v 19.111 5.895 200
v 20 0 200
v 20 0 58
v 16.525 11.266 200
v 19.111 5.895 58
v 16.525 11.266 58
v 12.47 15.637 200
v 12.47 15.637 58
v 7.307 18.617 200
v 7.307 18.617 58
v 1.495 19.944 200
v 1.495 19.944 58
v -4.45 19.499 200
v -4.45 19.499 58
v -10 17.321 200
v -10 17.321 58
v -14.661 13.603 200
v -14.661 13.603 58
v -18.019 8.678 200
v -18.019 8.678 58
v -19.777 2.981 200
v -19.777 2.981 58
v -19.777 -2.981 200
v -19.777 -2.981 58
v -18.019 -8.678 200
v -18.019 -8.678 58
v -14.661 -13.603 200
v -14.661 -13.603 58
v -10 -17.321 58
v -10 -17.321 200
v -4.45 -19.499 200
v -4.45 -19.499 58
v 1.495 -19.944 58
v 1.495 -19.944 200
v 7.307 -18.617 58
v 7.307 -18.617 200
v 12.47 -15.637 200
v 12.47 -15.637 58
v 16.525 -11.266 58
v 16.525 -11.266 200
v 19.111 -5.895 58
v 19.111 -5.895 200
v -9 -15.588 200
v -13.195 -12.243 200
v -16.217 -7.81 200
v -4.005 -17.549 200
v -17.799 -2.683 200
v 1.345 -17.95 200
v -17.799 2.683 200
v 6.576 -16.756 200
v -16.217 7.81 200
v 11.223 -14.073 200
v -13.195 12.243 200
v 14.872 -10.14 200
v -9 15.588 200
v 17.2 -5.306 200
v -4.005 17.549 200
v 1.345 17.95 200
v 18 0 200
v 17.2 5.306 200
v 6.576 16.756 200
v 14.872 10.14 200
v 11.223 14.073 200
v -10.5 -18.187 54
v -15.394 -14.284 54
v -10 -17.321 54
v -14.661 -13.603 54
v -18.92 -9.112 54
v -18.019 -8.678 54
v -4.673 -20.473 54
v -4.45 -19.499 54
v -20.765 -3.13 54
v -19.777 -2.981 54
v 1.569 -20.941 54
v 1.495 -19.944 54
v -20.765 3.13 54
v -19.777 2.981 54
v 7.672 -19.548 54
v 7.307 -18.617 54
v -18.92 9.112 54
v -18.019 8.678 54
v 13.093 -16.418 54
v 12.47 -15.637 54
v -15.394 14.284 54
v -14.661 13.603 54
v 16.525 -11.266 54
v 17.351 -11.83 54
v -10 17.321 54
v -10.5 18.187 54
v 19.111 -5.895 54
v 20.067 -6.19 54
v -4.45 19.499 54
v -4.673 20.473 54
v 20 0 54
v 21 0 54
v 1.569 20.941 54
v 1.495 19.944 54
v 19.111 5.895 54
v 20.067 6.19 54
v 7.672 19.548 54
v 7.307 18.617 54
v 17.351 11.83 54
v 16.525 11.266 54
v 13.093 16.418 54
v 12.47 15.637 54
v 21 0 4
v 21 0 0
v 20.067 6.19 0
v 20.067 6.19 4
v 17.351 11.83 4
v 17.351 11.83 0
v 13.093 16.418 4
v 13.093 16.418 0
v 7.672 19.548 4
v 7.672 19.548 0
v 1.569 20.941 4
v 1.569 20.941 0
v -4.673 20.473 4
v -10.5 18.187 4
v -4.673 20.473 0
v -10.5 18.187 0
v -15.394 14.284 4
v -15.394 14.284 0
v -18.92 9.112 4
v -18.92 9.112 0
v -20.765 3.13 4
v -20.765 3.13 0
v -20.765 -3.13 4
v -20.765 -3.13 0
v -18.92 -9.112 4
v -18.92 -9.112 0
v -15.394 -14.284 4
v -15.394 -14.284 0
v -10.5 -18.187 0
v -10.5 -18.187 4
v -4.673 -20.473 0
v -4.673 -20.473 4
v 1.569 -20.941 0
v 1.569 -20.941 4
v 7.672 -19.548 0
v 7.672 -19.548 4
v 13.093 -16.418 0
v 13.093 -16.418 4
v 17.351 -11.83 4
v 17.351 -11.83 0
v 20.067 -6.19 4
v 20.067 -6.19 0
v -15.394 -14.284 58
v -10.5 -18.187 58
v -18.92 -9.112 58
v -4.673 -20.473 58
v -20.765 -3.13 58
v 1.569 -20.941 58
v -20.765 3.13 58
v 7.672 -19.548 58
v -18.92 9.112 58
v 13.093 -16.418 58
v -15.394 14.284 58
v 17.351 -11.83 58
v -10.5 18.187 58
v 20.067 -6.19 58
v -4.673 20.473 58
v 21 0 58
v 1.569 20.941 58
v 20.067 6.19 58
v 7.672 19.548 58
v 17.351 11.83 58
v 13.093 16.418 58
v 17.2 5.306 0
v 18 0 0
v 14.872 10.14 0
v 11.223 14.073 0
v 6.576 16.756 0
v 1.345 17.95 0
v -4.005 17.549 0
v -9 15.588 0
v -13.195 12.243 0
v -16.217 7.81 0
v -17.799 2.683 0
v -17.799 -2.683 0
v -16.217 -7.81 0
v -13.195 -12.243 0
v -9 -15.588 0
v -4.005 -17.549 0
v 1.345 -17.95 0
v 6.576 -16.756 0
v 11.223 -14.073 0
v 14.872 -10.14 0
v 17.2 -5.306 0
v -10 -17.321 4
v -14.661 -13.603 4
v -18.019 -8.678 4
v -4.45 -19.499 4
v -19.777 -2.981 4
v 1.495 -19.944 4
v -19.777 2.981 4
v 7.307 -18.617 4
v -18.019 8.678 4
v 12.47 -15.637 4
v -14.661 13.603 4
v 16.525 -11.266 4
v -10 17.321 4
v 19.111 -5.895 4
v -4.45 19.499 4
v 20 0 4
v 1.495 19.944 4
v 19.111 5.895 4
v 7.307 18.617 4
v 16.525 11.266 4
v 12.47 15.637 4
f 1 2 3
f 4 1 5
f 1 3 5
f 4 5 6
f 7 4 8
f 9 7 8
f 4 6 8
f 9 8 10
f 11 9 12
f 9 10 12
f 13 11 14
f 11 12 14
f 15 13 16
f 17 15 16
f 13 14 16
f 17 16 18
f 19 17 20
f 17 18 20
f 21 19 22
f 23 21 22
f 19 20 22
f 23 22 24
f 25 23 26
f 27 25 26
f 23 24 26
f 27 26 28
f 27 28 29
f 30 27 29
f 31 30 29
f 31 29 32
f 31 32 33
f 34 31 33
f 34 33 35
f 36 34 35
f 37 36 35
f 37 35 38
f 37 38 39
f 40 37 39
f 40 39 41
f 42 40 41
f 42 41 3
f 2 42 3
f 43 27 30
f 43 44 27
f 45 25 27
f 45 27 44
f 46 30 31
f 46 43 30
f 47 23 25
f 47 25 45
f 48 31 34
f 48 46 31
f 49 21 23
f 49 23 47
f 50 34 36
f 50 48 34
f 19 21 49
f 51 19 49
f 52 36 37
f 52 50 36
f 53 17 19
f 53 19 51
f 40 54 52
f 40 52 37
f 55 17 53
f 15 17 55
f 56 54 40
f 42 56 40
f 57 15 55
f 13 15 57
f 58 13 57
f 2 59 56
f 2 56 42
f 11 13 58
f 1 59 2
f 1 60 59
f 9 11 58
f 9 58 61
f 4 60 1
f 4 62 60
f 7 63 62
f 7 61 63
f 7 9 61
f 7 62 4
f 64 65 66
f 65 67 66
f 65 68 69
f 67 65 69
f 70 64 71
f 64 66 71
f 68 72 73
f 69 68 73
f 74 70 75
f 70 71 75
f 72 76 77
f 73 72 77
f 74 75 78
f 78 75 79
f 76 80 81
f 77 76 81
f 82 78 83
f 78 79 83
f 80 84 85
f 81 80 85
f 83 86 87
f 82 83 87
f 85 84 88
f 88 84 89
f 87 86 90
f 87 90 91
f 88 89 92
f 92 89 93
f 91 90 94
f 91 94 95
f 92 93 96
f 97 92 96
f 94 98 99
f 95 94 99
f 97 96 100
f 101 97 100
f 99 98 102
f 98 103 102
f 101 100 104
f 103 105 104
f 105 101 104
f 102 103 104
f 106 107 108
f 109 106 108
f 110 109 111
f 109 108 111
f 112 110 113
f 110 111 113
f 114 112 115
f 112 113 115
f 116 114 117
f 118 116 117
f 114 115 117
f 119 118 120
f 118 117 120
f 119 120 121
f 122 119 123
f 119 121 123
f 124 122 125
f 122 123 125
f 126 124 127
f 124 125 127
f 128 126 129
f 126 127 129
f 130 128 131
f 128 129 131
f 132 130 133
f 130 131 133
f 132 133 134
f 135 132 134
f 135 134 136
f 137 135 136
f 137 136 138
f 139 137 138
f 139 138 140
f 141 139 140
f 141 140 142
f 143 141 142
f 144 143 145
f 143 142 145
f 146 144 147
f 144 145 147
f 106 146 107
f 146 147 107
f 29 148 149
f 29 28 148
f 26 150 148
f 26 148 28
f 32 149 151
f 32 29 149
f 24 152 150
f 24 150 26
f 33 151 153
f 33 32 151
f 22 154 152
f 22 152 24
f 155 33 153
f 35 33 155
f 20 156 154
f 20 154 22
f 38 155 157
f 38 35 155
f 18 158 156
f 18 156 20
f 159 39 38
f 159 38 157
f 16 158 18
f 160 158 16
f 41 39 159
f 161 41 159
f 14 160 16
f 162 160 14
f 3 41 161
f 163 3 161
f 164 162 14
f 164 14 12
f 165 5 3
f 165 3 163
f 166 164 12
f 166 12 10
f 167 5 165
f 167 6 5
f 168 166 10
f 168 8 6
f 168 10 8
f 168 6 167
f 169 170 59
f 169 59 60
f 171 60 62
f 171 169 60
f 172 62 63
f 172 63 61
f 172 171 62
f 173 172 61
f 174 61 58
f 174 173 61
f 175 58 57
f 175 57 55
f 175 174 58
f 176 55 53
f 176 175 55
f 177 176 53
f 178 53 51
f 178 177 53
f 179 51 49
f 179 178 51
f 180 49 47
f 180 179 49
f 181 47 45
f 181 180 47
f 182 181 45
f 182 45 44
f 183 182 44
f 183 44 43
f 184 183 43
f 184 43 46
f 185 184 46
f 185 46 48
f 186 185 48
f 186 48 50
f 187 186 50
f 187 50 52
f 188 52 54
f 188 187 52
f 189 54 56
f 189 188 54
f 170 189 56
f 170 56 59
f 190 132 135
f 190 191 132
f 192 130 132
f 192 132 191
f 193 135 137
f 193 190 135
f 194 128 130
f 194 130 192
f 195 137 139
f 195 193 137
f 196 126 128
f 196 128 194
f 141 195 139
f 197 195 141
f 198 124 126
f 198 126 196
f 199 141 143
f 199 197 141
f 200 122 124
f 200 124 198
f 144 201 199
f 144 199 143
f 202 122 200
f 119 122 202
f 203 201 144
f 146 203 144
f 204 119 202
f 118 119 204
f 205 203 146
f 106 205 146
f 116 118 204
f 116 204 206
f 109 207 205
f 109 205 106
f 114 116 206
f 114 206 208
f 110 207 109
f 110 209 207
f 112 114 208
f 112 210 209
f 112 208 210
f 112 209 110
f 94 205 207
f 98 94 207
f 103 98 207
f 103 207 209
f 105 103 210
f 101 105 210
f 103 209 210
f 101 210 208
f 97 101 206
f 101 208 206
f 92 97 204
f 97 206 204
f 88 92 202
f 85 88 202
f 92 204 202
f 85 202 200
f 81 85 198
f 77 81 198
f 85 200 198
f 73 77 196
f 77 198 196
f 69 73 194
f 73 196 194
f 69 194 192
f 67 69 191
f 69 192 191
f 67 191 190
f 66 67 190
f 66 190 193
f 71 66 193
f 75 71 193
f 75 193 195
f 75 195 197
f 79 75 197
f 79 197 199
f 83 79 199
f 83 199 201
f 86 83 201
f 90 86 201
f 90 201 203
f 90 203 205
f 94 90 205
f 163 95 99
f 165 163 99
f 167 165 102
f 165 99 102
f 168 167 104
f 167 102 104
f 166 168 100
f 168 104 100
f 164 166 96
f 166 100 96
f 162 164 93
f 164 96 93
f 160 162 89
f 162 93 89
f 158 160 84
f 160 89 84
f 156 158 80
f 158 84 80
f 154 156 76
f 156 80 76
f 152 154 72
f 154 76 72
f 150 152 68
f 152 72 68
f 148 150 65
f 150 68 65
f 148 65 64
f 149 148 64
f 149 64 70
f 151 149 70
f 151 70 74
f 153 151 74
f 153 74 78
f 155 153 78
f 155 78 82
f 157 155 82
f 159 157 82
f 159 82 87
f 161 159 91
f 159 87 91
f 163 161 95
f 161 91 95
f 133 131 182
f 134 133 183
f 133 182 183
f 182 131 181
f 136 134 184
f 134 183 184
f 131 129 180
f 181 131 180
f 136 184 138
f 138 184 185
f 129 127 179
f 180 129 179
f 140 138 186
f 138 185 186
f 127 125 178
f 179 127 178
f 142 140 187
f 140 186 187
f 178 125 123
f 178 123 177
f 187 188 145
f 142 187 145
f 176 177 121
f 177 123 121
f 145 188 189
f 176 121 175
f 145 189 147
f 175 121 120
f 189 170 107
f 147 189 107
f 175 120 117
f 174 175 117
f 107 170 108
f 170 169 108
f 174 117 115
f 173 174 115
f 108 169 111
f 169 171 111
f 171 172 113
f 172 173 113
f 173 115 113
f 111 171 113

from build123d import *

# Parameters (mm, degrees)
SKETCH2_R           = 20
SKETCH2_R_2         = 18
BOSS_EXTRUDE1_DEPTH = 200
SKETCH2_3_R         = 21
SKETCH2_3_R_2       = 20
BOSS_EXTRUDE2_DEPTH = 4
BOSS_EXTRUDE3_START = 54
SKETCH2_4_R         = 21
SKETCH2_4_R_2       = 20
BOSS_EXTRUDE3_DEPTH = 4


with BuildPart() as part:
    # Sketch2 → Boss-Extrude1 (new body)
    with BuildSketch(Plane.XY):
        Circle(SKETCH2_R)
        Circle(SKETCH2_R_2, mode=Mode.SUBTRACT)
    extrude(amount=BOSS_EXTRUDE1_DEPTH)

    # Sketch2<3> → Boss-Extrude2 (add)
    with BuildSketch(Plane.XY):
        Circle(SKETCH2_3_R)
        Circle(SKETCH2_3_R_2, mode=Mode.SUBTRACT)
    extrude(amount=BOSS_EXTRUDE2_DEPTH)

    # Sketch2<4> → Boss-Extrude3 (add)
    with BuildSketch(Plane.XY.offset(BOSS_EXTRUDE3_START)):
        Circle(SKETCH2_4_R)
        Circle(SKETCH2_4_R_2, mode=Mode.SUBTRACT)
    extrude(amount=BOSS_EXTRUDE3_DEPTH)


solid = part.part
